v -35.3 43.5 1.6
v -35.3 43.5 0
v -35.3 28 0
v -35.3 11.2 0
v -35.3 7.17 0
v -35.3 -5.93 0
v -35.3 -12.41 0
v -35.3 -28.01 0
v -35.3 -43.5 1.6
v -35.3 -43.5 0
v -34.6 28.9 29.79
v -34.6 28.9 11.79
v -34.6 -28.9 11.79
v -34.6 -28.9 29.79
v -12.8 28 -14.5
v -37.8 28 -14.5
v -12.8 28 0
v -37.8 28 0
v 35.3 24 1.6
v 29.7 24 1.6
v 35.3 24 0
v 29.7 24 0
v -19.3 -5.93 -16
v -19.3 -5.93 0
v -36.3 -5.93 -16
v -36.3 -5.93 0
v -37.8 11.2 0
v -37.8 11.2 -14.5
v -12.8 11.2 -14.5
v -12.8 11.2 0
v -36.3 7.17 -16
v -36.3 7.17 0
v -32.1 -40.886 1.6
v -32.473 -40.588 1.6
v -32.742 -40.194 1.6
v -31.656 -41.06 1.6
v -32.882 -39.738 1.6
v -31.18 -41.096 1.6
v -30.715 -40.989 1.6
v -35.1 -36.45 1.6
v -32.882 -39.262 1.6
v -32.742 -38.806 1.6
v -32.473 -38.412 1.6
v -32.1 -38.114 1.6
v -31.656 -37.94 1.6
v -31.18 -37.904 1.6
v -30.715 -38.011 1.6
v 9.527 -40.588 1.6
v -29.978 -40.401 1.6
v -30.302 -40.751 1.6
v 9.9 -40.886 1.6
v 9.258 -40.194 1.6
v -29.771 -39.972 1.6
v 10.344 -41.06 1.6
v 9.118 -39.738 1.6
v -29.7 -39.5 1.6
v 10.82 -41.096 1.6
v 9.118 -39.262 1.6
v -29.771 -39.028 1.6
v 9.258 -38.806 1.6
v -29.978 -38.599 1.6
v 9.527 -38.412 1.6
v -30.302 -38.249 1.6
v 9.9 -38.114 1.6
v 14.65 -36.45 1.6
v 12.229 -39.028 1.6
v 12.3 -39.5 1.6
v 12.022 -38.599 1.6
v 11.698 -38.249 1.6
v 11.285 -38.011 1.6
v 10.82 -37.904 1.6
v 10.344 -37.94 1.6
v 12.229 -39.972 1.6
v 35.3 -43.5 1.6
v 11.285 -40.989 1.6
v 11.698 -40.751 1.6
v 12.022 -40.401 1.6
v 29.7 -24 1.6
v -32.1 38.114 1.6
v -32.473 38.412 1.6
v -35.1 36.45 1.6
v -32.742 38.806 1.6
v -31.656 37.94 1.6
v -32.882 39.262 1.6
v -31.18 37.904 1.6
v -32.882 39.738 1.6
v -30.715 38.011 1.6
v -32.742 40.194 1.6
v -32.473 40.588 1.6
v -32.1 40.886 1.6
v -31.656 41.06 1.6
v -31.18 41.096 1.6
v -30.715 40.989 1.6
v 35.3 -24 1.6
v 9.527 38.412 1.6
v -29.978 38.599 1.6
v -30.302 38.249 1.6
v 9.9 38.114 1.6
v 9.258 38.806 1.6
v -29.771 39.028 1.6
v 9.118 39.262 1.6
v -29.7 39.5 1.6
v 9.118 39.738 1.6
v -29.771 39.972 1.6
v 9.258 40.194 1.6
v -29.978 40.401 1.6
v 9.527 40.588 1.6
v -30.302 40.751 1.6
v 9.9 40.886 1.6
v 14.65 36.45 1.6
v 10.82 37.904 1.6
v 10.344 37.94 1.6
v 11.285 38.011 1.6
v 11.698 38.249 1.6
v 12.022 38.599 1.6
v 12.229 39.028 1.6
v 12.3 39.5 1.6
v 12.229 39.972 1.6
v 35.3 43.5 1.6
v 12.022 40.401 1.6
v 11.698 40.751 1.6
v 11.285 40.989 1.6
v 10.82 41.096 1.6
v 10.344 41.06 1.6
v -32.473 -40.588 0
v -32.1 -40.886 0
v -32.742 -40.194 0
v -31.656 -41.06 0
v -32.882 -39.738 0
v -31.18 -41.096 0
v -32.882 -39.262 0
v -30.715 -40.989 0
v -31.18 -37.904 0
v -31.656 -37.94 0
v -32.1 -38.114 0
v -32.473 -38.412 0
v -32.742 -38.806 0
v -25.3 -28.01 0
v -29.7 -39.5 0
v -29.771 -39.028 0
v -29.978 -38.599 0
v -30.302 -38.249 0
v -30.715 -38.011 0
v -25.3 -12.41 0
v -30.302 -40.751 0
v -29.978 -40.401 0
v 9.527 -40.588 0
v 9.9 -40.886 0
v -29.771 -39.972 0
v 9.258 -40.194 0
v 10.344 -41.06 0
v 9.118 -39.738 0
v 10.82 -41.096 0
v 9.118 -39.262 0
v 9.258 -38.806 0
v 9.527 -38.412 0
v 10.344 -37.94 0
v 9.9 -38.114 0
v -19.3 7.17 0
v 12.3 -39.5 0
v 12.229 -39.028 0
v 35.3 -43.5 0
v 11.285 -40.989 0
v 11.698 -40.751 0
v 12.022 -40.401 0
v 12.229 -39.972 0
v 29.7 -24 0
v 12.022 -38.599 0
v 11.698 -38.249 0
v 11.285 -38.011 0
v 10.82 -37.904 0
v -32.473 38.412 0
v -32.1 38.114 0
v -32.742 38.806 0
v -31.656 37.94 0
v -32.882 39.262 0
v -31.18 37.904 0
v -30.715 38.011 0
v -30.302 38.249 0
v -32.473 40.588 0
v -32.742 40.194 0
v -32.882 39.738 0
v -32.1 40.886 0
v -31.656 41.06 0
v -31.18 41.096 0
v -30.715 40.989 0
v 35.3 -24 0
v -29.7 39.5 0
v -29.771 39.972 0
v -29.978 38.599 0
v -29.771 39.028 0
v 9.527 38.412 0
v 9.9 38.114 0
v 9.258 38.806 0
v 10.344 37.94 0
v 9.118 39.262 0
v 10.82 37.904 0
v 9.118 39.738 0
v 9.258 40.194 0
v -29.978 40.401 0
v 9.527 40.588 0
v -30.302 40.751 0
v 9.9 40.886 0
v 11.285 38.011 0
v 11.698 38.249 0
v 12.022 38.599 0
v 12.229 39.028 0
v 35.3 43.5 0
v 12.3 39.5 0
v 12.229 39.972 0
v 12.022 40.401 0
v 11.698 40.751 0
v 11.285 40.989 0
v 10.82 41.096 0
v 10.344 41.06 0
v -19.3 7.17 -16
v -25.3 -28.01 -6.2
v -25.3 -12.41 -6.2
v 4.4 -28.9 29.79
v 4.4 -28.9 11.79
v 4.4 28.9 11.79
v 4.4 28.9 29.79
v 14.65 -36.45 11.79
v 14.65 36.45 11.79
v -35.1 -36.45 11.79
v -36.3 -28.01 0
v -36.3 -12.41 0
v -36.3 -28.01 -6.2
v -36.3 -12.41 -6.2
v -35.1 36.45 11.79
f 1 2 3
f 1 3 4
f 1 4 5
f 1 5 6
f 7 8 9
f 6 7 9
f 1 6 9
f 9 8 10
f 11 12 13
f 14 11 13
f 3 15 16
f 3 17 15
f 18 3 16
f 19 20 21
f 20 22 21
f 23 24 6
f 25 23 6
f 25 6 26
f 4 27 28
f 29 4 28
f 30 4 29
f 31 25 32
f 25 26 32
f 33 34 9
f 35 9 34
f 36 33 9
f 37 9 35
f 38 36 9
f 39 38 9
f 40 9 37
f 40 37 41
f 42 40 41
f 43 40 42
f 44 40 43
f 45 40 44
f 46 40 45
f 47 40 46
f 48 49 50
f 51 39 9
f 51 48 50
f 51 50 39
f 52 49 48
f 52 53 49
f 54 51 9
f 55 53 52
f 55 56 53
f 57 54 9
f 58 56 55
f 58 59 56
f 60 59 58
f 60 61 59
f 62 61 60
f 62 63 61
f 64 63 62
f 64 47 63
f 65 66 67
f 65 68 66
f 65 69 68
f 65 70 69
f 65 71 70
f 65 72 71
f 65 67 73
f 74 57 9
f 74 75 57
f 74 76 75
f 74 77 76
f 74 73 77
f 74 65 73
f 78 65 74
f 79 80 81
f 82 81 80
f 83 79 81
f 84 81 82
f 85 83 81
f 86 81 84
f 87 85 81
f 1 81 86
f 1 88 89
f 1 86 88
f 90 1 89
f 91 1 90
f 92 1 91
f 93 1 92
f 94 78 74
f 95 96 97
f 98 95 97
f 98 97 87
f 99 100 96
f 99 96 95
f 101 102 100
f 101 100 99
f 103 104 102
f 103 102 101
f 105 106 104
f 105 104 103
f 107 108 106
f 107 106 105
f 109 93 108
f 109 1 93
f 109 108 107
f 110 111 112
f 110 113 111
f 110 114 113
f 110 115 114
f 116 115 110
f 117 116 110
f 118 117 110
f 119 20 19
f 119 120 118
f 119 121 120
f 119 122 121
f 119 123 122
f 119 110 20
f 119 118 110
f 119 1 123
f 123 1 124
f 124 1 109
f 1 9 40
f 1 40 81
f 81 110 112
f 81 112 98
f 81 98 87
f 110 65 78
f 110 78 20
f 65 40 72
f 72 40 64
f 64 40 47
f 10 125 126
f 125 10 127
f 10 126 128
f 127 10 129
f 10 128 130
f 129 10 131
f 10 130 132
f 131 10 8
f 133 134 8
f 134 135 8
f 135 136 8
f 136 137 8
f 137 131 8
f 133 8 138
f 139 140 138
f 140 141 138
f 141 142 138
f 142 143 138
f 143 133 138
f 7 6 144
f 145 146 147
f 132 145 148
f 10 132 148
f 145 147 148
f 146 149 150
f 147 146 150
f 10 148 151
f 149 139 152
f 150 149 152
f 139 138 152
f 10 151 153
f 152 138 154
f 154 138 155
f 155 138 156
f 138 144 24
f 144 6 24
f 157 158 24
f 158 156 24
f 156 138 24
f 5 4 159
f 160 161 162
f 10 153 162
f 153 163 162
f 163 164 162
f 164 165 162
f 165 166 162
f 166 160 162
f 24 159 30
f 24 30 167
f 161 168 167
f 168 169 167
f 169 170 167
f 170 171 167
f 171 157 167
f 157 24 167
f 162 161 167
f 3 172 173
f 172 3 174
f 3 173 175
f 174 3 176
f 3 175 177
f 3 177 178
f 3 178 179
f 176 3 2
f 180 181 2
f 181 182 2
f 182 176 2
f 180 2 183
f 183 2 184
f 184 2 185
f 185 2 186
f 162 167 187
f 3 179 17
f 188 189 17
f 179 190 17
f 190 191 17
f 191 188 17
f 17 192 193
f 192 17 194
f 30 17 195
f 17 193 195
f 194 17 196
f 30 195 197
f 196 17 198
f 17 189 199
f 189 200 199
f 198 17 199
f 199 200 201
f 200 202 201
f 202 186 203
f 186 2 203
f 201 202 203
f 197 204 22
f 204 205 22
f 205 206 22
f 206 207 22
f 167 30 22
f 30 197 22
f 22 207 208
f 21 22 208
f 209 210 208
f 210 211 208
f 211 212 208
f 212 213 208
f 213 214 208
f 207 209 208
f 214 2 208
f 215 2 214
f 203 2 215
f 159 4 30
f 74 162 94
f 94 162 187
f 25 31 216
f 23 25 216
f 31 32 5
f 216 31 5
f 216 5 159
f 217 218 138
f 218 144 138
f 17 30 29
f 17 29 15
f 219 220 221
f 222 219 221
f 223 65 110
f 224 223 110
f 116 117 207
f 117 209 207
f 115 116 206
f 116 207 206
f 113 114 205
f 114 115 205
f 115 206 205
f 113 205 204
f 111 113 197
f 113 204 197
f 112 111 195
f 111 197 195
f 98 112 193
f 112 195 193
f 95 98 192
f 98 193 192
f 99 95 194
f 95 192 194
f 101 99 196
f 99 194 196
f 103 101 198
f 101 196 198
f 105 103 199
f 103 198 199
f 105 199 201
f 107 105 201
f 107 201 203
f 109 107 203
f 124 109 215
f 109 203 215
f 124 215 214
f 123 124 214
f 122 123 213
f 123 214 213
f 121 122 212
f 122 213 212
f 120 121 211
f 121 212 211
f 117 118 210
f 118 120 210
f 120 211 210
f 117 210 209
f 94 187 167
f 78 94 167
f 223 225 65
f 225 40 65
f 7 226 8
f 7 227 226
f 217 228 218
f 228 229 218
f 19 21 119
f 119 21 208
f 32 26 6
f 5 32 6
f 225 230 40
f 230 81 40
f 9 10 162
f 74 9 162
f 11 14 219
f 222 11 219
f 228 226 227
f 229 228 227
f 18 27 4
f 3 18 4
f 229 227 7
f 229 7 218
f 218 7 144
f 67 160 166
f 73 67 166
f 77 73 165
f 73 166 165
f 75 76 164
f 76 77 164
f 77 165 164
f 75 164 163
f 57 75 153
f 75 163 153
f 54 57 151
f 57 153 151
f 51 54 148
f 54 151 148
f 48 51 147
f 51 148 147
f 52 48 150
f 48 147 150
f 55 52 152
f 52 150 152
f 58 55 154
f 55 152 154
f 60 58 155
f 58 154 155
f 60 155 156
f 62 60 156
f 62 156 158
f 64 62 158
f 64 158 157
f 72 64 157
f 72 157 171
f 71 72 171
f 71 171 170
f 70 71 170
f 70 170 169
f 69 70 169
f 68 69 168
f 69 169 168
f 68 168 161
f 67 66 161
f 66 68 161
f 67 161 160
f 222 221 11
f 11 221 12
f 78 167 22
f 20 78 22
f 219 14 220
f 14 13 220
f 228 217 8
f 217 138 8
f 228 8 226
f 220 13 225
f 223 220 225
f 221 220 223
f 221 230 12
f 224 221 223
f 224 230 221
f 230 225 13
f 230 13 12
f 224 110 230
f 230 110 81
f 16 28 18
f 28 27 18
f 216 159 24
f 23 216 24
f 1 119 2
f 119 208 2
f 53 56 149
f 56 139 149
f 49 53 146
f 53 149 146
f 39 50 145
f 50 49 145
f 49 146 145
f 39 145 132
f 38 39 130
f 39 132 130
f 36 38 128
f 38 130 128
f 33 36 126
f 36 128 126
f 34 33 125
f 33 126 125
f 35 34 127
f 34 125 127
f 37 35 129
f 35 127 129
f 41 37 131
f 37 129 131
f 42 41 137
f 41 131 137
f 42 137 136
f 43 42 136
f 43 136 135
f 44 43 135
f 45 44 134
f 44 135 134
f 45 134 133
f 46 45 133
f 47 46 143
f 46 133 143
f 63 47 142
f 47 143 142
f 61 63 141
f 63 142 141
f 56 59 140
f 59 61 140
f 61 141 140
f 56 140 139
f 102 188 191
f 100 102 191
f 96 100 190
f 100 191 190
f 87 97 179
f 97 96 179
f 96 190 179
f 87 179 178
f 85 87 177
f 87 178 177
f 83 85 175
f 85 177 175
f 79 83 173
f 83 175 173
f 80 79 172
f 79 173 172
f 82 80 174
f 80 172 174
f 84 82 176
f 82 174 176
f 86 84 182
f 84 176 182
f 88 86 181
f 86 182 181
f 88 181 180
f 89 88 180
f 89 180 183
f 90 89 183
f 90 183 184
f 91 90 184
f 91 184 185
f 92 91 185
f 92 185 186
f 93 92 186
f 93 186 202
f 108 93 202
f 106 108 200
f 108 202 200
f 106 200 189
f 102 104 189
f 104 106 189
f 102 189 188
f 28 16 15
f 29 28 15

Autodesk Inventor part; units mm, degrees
ref_plane "YZ Plane" through (0, 0, 0) normal (1, 0, 0) x (0, 1, 0)
ref_plane "XZ Plane" through (0, 0, 0) normal (0, 1, 0) x (-1, 0, 0)
ref_plane "XY Plane" through (0, 0, 0) normal (0, 0, 1) x (1, 0, 0)
sketch "スケッチ1" plane through (0, 0, 0) normal (0, 0, 1) x (1, 0, 0)
  line L0 (35.3, 43.5) -> (-35.3, 43.5)
  line L1 (-35.3, 43.5) -> (-35.3, -43.5)
  line L2 (-35.3, -43.5) -> (35.3, -43.5)
  line L3 (35.3, 43.5) -> (-35.3, -43.5) construction
  line L4 (-35.3, 43.5) -> (35.3, -43.5) construction
  circle A0 centre (-31.3, -39.5) radius 1.6
  circle A1 centre (10.7, -39.5) radius 1.6
  line L5 (29.7, 0) -> (-35.3, 0) construction
  circle A2 centre (-31.3, 39.5) radius 1.6
  circle A3 centre (10.7, 39.5) radius 1.6
  line L6 (14.65, 36.45) -> (-35.1, 36.45)
  line L7 (-35.1, 36.45) -> (-35.1, -36.45)
  line L8 (-35.1, -36.45) -> (14.65, -36.45)
  line L9 (14.65, -36.45) -> (14.65, 36.45)
  line L10 (14.65, 36.45) -> (-35.1, -36.45) construction
  line L11 (-35.1, 36.45) -> (14.65, -36.45) construction
  line L12 (35.3, -24) -> (29.7, -24)
  line L13 (29.7, -24) -> (29.7, 24)
  line L14 (29.7, 24) -> (35.3, 24)
  line L15 (35.3, -43.5) -> (35.3, -24)
  line L16 (35.3, 24) -> (35.3, 43.5)
  line L17 (4.4, 28.9) -> (-34.6, 28.9)
  line L18 (-34.6, 28.9) -> (-34.6, -28.9)
  line L19 (-34.6, -28.9) -> (4.4, -28.9)
  line L20 (4.4, -28.9) -> (4.4, 28.9)
  line L21 (4.4, 28.9) -> (-34.6, -28.9) construction
  line L22 (-34.6, 28.9) -> (4.4, -28.9) construction
  line L23 (-35.3, 11.2) -> (-12.8, 11.2)
  line L24 (-12.8, 11.2) -> (-12.8, 28)
  line L25 (-12.8, 28) -> (-35.3, 28)
  line L26 (-35.3, 11.2) -> (-37.8, 11.2)
  line L27 (-37.8, 11.2) -> (-37.8, 28)
  line L28 (-37.8, 28) -> (-35.3, 28)
  line L29 (-36.3, 7.17) -> (-19.3, 7.17)
  line L30 (-19.3, 7.17) -> (-19.3, -5.93)
  line L31 (-19.3, -5.93) -> (-36.3, -5.93)
  line L32 (-36.3, -5.93) -> (-36.3, 7.17)
  line L33 (-36.3, -12.41) -> (-25.3, -12.41)
  line L34 (-25.3, -12.41) -> (-25.3, -28.01)
  line L35 (-25.3, -28.01) -> (-36.3, -28.01)
  line L36 (-36.3, -28.01) -> (-36.3, -12.41)
  point P0 (0, 0)
  point P1 (-10.225, 0)
  point P2 (-10.225, 0)
  point P3 (-15.1, 0)
  dimension "d0" = 70.6
  dimension "d1" = 87
  dimension "d2" = 3.2
  dimension "d3" = 3.2
  dimension "d4" = 4
  dimension "d5" = 46
  dimension "d6" = 4
  dimension "d7" = 4
  dimension "d8" = 49.75
  dimension "d9" = 72.9
  dimension "d10" = 0.2
  dimension "d11" = 19.5
  dimension "d12" = 5.6
  dimension "d13" = 39
  dimension "d14" = 57.8
  dimension "d15" = 7.55
  dimension "d16" = 0.5
  dimension "d23" = 22.5
  dimension "d24" = 16.8
  dimension "d26" = 2.5
  dimension "d27" = 13.1
  dimension "d28" = 16
  dimension "d29" = 1
  dimension "d37" = 11
  dimension "d38" = 15.6
  dimension "d42" = 15.5
  dimension "d43" = 4.03
  dimension "d44" = 6.48
extrude "押し出し1" add sketch "スケッチ1" along normal blind 1.6 contours L16 L14 L13 L12 L15 L2 L1 L35 L7 L8 L9 L6 L25 L0 | L25 L7 L23 L1 | L23 L7 L29 L1 | L25 L18 L23 L7 | L7 L6 L9 L8 L35 L18 L19 L20 L17 L25 | L29 L7 L31 L1 | L23 L18 L29 L7 | L25 L24 L23 L18 | L18 L17 L20 L19 L35 L34 L33 L31 L30 L29 L23 L24 L25 | L31 L7 L33 L1 | L29 L18 L31 L7 | L33 L7 L35 L1 | L31 L18 L33 L7 | L29 L30 L31 L18 | L33 L18 L35 L7 | L33 L34 L35 L18
extrude "押し出し2" add sketch "スケッチ1" along normal blind 11.79 contours L25 L18 L23 L7 | L7 L6 L9 L8 L35 L18 L19 L20 L17 L25 | L23 L18 L29 L7 | L25 L24 L23 L18 | L18 L17 L20 L19 L35 L34 L33 L31 L30 L29 L23 L24 L25 | L29 L18 L31 L7 | L31 L18 L33 L7 | L29 L30 L31 L18 | L33 L18 L35 L7 | L33 L34 L35 L18
extrude "押し出し3" add sketch "スケッチ1" along normal blind 29.79 contours L25 L24 L23 L18 | L18 L17 L20 L19 L35 L34 L33 L31 L30 L29 L23 L24 L25 | L29 L30 L31 L18 | L33 L34 L35 L18
extrude "押し出し4" add sketch "スケッチ1" against normal blind 14.5 contours L25 L7 L23 L1 | L1 L26 L27 L28 | L25 L18 L23 L7 | L25 L24 L23 L18
extrude "押し出し5" add sketch "スケッチ1" against normal blind 16 contours L29 L7 L31 L1 | L1 L31 L32 L29 | L29 L18 L31 L7 | L29 L30 L31 L18
extrude "押し出し6" add sketch "スケッチ1" against normal blind 6.2 contours L33 L7 L35 L1 | L1 L35 L36 L33 | L33 L18 L35 L7 | L33 L34 L35 L18
equation "\"d7\" = d6"
properties part number "JetsonXavierNX_and_EN715"
